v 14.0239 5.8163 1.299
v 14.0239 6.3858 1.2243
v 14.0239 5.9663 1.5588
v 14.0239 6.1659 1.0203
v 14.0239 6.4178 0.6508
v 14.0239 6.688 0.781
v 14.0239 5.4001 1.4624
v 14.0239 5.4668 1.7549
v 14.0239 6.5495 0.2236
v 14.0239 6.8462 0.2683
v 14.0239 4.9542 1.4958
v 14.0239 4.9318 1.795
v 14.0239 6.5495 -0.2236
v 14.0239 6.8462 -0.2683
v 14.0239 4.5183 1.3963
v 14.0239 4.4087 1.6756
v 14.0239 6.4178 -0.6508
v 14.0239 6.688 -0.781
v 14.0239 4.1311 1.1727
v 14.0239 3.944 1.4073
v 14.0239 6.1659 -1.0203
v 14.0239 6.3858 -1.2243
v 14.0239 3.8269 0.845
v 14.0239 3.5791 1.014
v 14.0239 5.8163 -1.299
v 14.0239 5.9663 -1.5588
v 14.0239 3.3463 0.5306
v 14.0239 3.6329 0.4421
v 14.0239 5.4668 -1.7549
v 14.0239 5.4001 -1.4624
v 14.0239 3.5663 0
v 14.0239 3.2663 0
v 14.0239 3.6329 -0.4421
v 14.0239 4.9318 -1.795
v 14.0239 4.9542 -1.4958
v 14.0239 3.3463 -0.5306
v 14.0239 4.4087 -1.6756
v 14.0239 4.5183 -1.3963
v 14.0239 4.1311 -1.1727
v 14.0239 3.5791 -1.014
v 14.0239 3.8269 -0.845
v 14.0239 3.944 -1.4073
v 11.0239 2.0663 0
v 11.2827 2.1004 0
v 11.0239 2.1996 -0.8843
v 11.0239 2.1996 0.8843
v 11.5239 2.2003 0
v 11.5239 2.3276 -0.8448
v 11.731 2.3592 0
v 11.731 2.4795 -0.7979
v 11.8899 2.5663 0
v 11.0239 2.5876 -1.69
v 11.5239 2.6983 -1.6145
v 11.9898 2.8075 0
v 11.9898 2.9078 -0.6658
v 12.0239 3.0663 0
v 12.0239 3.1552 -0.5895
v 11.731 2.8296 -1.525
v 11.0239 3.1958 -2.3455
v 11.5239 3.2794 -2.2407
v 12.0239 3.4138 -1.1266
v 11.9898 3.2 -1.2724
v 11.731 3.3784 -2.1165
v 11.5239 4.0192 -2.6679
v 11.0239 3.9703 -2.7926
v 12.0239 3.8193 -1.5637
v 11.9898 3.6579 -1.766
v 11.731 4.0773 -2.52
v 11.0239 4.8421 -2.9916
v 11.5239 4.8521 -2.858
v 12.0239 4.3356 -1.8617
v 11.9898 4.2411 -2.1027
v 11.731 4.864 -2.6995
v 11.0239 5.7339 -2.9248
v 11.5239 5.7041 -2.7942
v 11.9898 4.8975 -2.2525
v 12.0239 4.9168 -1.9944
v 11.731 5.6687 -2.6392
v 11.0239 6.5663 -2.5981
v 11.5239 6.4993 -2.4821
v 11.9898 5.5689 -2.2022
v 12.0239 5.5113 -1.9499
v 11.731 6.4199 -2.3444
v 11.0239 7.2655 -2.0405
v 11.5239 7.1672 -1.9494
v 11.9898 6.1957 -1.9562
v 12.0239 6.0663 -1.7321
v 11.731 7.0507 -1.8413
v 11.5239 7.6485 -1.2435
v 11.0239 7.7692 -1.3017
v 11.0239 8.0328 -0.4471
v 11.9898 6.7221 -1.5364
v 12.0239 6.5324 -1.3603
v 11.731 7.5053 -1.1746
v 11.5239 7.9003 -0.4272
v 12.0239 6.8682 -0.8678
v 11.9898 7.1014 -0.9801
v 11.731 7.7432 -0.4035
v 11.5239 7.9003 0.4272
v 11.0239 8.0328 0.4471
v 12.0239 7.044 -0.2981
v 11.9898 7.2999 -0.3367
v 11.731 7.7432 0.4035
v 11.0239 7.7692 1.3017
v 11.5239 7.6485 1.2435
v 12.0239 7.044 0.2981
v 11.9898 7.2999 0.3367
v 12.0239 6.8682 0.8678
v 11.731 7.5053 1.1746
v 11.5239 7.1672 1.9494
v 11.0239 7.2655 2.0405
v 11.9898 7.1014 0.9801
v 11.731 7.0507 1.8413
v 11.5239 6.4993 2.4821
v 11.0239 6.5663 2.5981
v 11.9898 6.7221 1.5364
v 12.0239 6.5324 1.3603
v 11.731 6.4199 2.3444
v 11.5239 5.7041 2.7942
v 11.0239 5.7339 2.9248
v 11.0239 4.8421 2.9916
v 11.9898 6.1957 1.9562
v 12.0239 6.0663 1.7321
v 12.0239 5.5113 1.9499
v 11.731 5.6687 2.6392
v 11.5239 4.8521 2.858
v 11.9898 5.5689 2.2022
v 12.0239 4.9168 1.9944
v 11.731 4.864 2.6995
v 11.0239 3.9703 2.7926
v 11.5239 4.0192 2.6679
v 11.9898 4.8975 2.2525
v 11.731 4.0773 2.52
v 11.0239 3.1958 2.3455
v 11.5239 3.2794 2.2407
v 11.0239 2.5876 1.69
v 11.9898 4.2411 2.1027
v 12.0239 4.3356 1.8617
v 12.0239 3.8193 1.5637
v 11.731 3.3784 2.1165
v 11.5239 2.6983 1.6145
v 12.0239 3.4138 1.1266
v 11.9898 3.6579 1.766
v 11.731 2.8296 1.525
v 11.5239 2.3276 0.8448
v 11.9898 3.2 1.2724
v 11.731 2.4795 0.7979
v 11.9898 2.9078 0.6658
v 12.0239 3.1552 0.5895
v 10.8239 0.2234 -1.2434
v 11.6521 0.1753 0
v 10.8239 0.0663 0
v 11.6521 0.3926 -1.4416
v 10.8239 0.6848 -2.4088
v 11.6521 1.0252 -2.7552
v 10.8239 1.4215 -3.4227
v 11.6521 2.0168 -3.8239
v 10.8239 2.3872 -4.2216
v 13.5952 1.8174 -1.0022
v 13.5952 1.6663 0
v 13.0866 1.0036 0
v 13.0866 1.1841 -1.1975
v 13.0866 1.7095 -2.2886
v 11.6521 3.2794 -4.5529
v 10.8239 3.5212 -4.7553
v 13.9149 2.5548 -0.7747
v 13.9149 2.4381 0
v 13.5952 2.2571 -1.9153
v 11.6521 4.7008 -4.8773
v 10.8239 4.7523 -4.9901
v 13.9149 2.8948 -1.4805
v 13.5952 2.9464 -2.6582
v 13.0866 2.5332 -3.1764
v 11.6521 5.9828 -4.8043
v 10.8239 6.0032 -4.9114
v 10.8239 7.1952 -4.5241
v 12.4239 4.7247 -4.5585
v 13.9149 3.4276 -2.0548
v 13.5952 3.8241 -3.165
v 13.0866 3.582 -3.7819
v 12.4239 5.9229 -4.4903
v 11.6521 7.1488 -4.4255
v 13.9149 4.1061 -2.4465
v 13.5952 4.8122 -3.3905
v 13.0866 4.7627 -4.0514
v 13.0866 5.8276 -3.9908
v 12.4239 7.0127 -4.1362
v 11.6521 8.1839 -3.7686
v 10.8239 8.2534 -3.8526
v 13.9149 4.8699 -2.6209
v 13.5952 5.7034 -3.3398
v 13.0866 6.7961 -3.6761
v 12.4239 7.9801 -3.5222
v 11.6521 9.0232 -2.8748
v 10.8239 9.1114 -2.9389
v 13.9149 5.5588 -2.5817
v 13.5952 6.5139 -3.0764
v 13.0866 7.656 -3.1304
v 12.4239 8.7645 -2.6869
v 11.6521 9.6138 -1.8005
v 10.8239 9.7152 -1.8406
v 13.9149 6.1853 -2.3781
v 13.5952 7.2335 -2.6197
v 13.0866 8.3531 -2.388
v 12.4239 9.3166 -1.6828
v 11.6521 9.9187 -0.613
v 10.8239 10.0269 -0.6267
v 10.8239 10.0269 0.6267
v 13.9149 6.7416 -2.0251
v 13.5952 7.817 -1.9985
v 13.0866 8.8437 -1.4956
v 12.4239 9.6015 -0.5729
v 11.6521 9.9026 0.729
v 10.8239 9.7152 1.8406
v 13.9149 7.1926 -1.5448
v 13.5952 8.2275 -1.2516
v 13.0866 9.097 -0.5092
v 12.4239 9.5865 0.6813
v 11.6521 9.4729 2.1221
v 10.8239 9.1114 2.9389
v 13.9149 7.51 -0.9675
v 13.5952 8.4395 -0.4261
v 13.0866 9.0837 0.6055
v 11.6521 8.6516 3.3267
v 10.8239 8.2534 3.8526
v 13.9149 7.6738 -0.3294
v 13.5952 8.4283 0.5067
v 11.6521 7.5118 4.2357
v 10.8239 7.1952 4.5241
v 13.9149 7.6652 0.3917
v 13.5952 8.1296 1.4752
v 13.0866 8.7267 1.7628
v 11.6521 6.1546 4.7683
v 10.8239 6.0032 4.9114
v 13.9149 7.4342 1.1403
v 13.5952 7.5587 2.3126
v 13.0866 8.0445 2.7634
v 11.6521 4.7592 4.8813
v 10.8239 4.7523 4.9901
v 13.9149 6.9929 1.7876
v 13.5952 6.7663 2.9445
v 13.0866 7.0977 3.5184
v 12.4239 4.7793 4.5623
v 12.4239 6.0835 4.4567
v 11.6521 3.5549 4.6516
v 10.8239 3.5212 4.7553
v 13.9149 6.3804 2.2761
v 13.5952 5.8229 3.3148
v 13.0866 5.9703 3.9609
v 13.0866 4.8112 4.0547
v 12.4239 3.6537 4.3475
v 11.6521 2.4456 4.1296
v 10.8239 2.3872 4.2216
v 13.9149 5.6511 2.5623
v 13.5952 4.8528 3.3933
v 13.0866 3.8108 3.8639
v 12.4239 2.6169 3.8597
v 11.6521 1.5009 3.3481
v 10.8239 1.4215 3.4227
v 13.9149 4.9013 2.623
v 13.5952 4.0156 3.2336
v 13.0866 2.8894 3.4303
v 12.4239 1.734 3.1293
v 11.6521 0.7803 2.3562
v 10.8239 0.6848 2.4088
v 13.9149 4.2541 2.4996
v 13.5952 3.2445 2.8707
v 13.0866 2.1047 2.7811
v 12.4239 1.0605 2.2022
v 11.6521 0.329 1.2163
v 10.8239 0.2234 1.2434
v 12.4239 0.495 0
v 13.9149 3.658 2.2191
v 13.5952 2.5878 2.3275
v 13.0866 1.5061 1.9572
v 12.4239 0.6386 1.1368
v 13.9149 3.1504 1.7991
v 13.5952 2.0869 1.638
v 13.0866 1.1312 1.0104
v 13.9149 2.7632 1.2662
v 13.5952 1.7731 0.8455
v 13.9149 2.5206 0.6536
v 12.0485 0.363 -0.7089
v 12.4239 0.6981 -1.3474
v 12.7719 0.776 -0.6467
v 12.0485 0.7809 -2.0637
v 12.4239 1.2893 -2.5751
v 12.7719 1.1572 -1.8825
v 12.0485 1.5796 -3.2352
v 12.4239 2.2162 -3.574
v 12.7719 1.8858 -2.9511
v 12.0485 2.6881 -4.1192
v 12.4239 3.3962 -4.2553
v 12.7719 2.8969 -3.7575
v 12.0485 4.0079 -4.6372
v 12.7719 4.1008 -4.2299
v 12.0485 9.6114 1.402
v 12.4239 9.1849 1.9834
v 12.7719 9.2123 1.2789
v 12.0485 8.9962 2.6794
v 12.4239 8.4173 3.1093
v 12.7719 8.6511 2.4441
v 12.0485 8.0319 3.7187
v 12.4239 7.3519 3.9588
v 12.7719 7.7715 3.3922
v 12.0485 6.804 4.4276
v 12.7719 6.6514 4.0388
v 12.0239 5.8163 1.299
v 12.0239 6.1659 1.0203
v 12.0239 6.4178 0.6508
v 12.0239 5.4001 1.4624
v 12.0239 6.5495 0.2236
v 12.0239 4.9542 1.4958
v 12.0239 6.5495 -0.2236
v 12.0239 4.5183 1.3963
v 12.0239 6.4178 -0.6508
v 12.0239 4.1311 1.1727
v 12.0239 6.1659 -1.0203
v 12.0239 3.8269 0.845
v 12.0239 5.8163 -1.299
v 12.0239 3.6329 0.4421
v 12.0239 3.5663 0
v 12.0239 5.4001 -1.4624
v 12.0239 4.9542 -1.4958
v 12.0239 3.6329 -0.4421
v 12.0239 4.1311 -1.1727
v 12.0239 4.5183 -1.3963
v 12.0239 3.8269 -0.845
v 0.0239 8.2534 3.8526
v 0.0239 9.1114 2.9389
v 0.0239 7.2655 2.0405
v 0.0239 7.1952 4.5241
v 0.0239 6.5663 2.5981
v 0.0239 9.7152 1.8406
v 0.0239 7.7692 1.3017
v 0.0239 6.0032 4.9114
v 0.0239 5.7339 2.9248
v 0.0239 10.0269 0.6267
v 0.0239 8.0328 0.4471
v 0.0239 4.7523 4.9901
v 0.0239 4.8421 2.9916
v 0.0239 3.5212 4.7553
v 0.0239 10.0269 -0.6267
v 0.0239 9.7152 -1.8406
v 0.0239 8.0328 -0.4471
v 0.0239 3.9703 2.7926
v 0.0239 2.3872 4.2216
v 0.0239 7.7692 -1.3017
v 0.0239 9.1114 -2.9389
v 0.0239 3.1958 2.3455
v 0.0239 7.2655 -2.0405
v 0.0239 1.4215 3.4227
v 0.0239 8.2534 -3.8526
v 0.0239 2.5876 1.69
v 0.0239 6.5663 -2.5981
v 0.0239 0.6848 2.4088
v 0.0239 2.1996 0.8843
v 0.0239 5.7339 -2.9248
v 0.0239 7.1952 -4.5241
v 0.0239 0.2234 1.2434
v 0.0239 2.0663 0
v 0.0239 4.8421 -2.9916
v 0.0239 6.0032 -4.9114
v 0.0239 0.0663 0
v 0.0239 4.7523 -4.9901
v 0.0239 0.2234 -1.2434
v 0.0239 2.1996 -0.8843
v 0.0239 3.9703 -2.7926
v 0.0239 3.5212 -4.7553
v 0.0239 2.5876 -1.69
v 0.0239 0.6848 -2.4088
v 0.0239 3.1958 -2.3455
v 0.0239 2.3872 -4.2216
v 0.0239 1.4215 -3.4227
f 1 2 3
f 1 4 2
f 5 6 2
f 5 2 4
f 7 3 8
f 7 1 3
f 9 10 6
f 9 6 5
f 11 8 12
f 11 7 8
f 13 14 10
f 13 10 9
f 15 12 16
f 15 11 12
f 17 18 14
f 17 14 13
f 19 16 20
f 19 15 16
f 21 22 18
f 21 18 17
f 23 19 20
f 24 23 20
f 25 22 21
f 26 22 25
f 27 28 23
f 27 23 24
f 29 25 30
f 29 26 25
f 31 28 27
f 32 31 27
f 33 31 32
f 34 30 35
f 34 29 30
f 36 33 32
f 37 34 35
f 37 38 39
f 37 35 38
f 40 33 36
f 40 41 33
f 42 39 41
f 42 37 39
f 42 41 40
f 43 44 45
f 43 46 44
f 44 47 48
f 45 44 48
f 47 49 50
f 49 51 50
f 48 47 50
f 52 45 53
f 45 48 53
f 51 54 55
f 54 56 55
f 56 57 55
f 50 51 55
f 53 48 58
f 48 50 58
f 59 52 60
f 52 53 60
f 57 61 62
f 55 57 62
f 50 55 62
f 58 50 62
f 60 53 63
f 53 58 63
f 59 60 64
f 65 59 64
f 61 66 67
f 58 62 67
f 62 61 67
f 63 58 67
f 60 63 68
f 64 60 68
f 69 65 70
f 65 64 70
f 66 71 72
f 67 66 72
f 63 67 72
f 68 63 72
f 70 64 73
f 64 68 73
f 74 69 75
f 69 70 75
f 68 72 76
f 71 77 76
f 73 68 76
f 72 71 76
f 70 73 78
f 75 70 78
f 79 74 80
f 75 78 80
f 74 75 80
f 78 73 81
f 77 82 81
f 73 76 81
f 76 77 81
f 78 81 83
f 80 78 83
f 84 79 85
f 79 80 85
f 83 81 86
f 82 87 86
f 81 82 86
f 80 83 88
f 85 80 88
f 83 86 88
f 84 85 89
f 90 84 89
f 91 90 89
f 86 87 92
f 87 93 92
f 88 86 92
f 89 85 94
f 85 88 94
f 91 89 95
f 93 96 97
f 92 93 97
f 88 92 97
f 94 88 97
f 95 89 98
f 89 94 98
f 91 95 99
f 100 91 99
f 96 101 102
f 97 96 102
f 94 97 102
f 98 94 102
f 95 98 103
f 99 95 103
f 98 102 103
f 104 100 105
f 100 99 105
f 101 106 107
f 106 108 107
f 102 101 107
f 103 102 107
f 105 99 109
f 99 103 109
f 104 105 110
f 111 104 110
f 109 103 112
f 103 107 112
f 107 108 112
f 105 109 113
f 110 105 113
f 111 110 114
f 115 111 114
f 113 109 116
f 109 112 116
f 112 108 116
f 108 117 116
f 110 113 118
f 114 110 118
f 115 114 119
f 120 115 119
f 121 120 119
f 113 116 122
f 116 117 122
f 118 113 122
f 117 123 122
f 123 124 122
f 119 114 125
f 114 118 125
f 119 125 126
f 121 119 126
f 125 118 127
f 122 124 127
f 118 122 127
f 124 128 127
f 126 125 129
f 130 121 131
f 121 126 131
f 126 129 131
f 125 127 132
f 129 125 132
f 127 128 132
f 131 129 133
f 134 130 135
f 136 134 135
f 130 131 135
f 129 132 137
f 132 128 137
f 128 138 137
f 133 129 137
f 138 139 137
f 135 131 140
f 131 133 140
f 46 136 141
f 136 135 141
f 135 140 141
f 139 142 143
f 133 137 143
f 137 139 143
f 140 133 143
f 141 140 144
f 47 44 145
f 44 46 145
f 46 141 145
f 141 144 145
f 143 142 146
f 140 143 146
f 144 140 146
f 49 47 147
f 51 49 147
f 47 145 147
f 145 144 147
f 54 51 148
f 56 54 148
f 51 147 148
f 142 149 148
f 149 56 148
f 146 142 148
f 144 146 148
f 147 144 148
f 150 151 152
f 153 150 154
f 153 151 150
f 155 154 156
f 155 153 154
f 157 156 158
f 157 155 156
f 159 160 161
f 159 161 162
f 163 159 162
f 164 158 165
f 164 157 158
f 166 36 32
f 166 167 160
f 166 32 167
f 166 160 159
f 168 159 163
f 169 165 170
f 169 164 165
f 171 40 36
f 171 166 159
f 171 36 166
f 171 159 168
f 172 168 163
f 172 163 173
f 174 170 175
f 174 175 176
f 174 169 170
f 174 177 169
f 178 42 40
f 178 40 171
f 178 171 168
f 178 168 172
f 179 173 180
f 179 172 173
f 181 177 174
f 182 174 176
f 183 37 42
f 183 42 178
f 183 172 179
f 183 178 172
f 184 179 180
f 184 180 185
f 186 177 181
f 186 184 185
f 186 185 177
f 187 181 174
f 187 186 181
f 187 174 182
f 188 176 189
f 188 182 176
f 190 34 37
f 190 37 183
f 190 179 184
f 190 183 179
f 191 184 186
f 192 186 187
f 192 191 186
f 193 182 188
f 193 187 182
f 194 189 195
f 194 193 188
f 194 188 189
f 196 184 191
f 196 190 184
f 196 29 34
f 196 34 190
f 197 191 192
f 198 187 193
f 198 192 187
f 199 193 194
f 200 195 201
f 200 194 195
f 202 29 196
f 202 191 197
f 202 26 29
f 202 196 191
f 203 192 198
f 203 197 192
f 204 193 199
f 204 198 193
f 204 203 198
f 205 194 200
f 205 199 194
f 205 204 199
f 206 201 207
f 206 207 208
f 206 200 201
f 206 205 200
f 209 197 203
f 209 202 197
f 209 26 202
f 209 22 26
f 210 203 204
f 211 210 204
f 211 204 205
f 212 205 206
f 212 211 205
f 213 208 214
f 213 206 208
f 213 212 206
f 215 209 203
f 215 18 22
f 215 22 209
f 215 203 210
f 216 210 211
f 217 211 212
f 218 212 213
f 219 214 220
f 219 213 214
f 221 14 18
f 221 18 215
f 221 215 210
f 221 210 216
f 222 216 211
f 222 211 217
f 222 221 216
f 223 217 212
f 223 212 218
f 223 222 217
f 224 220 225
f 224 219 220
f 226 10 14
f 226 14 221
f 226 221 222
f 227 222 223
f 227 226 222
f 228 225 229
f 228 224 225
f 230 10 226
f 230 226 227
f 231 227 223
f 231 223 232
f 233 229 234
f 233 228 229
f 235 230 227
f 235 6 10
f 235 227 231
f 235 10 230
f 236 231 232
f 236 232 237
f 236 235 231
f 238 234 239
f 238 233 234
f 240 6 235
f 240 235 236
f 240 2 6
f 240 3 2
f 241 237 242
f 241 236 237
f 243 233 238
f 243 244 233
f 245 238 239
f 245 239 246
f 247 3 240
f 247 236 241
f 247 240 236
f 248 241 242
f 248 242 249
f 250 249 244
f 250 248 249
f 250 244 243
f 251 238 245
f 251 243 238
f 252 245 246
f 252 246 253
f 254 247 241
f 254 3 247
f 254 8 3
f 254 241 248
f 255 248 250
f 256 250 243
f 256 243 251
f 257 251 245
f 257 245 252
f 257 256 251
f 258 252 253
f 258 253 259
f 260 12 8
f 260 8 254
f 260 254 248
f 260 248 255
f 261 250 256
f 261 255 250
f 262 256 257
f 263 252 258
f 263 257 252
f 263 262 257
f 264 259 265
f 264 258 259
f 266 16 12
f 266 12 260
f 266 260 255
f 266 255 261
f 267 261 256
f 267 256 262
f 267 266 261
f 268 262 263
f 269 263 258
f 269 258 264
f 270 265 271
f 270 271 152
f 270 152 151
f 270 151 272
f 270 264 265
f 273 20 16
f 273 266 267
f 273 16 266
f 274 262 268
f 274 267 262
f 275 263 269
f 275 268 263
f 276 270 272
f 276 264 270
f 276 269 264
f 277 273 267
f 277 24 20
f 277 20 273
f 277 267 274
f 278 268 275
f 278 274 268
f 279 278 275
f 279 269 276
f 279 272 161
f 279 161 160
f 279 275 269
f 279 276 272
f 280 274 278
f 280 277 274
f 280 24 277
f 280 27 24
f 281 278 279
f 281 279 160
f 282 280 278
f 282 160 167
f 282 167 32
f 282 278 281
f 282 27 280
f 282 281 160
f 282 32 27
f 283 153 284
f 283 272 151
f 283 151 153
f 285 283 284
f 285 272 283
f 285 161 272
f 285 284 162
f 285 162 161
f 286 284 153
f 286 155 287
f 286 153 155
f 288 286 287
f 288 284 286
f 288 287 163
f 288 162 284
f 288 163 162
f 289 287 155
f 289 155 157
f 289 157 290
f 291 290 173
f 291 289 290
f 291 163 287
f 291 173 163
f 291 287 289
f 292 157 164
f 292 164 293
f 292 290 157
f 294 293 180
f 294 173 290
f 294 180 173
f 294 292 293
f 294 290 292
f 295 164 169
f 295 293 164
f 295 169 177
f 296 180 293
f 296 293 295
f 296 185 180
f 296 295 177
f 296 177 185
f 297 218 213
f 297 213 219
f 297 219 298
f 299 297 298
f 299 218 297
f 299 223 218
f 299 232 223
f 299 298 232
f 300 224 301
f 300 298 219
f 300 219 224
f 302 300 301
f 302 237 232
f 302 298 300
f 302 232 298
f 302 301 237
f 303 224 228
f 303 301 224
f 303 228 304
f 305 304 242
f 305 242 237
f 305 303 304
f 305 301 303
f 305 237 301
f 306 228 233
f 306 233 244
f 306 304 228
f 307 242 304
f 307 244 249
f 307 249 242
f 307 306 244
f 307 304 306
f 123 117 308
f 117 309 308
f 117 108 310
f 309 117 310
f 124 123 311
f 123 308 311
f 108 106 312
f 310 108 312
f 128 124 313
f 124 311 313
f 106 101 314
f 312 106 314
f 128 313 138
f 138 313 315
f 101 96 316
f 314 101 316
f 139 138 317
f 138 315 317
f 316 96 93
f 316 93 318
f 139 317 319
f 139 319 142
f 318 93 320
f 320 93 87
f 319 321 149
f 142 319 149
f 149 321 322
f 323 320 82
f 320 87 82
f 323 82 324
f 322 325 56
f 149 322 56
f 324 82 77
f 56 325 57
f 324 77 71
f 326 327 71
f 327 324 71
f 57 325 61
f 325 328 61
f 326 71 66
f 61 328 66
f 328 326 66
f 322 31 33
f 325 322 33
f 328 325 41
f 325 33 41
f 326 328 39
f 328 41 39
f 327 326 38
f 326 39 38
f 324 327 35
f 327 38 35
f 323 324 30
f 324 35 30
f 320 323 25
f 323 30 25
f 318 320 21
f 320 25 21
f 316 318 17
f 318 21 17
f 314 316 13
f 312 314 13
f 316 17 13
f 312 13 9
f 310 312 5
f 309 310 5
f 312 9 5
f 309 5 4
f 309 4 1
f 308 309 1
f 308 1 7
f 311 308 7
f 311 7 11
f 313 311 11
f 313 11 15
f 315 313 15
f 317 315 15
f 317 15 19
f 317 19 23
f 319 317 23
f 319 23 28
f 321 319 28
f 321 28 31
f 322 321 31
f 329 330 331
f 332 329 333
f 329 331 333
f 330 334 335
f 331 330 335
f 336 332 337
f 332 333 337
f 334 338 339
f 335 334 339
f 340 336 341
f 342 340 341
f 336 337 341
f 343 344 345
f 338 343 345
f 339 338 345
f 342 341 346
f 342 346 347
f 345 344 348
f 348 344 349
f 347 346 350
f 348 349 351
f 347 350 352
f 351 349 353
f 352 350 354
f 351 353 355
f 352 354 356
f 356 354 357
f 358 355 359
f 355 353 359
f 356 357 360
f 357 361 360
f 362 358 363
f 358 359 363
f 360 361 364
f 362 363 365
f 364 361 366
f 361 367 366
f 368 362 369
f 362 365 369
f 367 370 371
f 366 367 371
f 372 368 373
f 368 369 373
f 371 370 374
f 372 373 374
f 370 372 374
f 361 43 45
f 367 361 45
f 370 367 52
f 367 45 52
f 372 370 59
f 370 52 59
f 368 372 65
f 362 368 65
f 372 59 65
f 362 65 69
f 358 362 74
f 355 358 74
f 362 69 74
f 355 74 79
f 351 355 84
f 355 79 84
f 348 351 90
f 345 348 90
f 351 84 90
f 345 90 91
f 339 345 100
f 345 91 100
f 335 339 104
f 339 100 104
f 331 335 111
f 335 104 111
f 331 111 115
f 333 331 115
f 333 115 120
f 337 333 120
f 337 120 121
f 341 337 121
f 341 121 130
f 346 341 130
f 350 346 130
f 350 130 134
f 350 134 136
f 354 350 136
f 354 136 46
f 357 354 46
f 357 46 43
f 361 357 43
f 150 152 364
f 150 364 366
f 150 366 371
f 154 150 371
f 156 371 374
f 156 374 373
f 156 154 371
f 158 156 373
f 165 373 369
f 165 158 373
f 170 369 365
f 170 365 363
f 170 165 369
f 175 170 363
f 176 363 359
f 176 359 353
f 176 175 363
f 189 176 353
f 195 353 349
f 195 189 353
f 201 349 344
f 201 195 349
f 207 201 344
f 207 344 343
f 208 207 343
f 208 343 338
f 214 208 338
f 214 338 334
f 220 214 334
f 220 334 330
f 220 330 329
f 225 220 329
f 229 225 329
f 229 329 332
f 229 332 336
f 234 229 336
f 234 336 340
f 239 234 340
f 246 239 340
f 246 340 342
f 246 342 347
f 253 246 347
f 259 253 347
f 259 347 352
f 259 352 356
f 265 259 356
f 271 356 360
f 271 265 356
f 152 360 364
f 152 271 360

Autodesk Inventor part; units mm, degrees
ref_plane "YZ Plane" through (0, 0, 0) normal (1, 0, 0) x (0, 1, 0)
ref_plane "XZ Plane" through (0, 0, 0) normal (0, 1, 0) x (-1, 0, 0)
ref_plane "XY Plane" through (0, 0, 0) normal (0, 0, 1) x (1, 0, 0)
sketch "Блок1" plane through (0, 0, 0) normal (0, 0, 1) x (1, 0, 0)
  line L0 (-20.8941, 6.9119) -> (-9.8941, 6.9119)
  line L1 (-8.8941, 8.4119) -> (-6.8941, 8.4119)
  point P0 (-11.6441, 7.6619)
sketch "Эскиз1" plane through (0, 0, 0) normal (0, 0, 1) x (1, 0, 0)
  line L0 (0.0239, 0.0663) -> (10.8239, 0.0663)
  line L1 (14.0239, 3.2663) -> (14.0239, 3.5663)
  arc A0 (10.8239, 0.0663) -> (14.0239, 3.2663) centre (10.8239, 3.2663) ccw
  line L2 (0.0239, 0.0663) -> (0.0239, 2.0663)
  line L3 (12.0239, 3.0663) -> (12.0239, 3.5663)
  arc A1 (11.0239, 2.0663) -> (12.0239, 3.0663) centre (11.0239, 3.0663) ccw
  line L4 (14.0239, 3.5663) -> (14.0239, 5.0663)
  line L5 (0.0239, 5.0663) -> (7.906, 5.0663)
  line L6 (0.0239, 2.0663) -> (11.0239, 2.0663)
  line L7 (12.0239, 3.5663) -> (14.0239, 3.5663)
  point P0 (0, 0)
  point P1 (14.0239, 0.0663)
  point P2 (11.0239, 2.0663)
  dimension "d8" = 2
  dimension "d15" = 3.2
  dimension "d18" = 5
  dimension "d19" = 10.8
revolve "Вращение1" add sketch "Эскиз1" angle 360 about axis through (0.0239, 5.0663, 0) along (1, 0, 0)
properties part number "12"
